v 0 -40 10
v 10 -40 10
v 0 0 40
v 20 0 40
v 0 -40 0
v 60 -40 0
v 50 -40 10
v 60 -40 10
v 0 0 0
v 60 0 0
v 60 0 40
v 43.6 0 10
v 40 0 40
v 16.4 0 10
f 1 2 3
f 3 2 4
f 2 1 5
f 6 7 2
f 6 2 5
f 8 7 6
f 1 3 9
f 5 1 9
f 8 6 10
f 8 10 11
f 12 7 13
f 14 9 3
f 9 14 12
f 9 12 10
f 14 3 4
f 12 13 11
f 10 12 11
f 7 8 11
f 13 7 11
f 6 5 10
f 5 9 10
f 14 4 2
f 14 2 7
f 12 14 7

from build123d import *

# Parameters (mm, degrees)
F1_DEPTH  = 40
F3_DEPTH  = 60
F5_DEPTH  = 40
F7_DEPTH  = 40
F8_W      = 10
F8_H      = 10
F9_DEPTH  = 40
F10_W     = 10
F10_H     = 10
F11_DEPTH = 40


with BuildPart() as f1:
    # F0 (on Front) → F1 (new body)
    with BuildSketch(Plane.XZ):
        Polygon((0, 40), (0, 0), (60, 0), (60, 40), (40, 40), (40, 10), (20, 10), (20, 40), align=None)
    extrude(amount=F1_DEPTH)

    # F2 (on face) → F3 (cut)
    with BuildSketch(Plane.YZ.offset(60)):
        Polygon((-40, 10), (0, 40), (-40, 40), align=None)
    extrude(amount=-F3_DEPTH, mode=Mode.SUBTRACT)

    # F4 (on face) → F5 (cut)
    with BuildSketch(Plane(origin=(0, -19.2, 25.6), x_dir=(1, 0, 0), z_dir=(0, -0.6, 0.8))):
        Polygon((20, -26), (20, 24), (10, -26), align=None)
    extrude(amount=-F5_DEPTH, mode=Mode.SUBTRACT)

    # F6 (on face) → F7 (cut)
    with BuildSketch(Plane(origin=(0, -19.2, 25.6), x_dir=(1, 0, 0), z_dir=(0, -0.6, 0.8))):
        Polygon((50, -26), (40, 24), (40, -26), align=None)
    extrude(amount=-F7_DEPTH, mode=Mode.SUBTRACT)

    # F8 (on face) → F9 (join)
    with BuildSketch(Plane.XZ.offset(40)):
        with Locations((15, 5)):
            Rectangle(F8_W, F8_H)
    extrude(amount=-F9_DEPTH)

    # F10 (on face) → F11 (join)
    with BuildSketch(Plane.XZ.offset(40)):
        with Locations((45, 5)):
            Rectangle(F10_W, F10_H)
    extrude(amount=-F11_DEPTH)


solid = f1.part
